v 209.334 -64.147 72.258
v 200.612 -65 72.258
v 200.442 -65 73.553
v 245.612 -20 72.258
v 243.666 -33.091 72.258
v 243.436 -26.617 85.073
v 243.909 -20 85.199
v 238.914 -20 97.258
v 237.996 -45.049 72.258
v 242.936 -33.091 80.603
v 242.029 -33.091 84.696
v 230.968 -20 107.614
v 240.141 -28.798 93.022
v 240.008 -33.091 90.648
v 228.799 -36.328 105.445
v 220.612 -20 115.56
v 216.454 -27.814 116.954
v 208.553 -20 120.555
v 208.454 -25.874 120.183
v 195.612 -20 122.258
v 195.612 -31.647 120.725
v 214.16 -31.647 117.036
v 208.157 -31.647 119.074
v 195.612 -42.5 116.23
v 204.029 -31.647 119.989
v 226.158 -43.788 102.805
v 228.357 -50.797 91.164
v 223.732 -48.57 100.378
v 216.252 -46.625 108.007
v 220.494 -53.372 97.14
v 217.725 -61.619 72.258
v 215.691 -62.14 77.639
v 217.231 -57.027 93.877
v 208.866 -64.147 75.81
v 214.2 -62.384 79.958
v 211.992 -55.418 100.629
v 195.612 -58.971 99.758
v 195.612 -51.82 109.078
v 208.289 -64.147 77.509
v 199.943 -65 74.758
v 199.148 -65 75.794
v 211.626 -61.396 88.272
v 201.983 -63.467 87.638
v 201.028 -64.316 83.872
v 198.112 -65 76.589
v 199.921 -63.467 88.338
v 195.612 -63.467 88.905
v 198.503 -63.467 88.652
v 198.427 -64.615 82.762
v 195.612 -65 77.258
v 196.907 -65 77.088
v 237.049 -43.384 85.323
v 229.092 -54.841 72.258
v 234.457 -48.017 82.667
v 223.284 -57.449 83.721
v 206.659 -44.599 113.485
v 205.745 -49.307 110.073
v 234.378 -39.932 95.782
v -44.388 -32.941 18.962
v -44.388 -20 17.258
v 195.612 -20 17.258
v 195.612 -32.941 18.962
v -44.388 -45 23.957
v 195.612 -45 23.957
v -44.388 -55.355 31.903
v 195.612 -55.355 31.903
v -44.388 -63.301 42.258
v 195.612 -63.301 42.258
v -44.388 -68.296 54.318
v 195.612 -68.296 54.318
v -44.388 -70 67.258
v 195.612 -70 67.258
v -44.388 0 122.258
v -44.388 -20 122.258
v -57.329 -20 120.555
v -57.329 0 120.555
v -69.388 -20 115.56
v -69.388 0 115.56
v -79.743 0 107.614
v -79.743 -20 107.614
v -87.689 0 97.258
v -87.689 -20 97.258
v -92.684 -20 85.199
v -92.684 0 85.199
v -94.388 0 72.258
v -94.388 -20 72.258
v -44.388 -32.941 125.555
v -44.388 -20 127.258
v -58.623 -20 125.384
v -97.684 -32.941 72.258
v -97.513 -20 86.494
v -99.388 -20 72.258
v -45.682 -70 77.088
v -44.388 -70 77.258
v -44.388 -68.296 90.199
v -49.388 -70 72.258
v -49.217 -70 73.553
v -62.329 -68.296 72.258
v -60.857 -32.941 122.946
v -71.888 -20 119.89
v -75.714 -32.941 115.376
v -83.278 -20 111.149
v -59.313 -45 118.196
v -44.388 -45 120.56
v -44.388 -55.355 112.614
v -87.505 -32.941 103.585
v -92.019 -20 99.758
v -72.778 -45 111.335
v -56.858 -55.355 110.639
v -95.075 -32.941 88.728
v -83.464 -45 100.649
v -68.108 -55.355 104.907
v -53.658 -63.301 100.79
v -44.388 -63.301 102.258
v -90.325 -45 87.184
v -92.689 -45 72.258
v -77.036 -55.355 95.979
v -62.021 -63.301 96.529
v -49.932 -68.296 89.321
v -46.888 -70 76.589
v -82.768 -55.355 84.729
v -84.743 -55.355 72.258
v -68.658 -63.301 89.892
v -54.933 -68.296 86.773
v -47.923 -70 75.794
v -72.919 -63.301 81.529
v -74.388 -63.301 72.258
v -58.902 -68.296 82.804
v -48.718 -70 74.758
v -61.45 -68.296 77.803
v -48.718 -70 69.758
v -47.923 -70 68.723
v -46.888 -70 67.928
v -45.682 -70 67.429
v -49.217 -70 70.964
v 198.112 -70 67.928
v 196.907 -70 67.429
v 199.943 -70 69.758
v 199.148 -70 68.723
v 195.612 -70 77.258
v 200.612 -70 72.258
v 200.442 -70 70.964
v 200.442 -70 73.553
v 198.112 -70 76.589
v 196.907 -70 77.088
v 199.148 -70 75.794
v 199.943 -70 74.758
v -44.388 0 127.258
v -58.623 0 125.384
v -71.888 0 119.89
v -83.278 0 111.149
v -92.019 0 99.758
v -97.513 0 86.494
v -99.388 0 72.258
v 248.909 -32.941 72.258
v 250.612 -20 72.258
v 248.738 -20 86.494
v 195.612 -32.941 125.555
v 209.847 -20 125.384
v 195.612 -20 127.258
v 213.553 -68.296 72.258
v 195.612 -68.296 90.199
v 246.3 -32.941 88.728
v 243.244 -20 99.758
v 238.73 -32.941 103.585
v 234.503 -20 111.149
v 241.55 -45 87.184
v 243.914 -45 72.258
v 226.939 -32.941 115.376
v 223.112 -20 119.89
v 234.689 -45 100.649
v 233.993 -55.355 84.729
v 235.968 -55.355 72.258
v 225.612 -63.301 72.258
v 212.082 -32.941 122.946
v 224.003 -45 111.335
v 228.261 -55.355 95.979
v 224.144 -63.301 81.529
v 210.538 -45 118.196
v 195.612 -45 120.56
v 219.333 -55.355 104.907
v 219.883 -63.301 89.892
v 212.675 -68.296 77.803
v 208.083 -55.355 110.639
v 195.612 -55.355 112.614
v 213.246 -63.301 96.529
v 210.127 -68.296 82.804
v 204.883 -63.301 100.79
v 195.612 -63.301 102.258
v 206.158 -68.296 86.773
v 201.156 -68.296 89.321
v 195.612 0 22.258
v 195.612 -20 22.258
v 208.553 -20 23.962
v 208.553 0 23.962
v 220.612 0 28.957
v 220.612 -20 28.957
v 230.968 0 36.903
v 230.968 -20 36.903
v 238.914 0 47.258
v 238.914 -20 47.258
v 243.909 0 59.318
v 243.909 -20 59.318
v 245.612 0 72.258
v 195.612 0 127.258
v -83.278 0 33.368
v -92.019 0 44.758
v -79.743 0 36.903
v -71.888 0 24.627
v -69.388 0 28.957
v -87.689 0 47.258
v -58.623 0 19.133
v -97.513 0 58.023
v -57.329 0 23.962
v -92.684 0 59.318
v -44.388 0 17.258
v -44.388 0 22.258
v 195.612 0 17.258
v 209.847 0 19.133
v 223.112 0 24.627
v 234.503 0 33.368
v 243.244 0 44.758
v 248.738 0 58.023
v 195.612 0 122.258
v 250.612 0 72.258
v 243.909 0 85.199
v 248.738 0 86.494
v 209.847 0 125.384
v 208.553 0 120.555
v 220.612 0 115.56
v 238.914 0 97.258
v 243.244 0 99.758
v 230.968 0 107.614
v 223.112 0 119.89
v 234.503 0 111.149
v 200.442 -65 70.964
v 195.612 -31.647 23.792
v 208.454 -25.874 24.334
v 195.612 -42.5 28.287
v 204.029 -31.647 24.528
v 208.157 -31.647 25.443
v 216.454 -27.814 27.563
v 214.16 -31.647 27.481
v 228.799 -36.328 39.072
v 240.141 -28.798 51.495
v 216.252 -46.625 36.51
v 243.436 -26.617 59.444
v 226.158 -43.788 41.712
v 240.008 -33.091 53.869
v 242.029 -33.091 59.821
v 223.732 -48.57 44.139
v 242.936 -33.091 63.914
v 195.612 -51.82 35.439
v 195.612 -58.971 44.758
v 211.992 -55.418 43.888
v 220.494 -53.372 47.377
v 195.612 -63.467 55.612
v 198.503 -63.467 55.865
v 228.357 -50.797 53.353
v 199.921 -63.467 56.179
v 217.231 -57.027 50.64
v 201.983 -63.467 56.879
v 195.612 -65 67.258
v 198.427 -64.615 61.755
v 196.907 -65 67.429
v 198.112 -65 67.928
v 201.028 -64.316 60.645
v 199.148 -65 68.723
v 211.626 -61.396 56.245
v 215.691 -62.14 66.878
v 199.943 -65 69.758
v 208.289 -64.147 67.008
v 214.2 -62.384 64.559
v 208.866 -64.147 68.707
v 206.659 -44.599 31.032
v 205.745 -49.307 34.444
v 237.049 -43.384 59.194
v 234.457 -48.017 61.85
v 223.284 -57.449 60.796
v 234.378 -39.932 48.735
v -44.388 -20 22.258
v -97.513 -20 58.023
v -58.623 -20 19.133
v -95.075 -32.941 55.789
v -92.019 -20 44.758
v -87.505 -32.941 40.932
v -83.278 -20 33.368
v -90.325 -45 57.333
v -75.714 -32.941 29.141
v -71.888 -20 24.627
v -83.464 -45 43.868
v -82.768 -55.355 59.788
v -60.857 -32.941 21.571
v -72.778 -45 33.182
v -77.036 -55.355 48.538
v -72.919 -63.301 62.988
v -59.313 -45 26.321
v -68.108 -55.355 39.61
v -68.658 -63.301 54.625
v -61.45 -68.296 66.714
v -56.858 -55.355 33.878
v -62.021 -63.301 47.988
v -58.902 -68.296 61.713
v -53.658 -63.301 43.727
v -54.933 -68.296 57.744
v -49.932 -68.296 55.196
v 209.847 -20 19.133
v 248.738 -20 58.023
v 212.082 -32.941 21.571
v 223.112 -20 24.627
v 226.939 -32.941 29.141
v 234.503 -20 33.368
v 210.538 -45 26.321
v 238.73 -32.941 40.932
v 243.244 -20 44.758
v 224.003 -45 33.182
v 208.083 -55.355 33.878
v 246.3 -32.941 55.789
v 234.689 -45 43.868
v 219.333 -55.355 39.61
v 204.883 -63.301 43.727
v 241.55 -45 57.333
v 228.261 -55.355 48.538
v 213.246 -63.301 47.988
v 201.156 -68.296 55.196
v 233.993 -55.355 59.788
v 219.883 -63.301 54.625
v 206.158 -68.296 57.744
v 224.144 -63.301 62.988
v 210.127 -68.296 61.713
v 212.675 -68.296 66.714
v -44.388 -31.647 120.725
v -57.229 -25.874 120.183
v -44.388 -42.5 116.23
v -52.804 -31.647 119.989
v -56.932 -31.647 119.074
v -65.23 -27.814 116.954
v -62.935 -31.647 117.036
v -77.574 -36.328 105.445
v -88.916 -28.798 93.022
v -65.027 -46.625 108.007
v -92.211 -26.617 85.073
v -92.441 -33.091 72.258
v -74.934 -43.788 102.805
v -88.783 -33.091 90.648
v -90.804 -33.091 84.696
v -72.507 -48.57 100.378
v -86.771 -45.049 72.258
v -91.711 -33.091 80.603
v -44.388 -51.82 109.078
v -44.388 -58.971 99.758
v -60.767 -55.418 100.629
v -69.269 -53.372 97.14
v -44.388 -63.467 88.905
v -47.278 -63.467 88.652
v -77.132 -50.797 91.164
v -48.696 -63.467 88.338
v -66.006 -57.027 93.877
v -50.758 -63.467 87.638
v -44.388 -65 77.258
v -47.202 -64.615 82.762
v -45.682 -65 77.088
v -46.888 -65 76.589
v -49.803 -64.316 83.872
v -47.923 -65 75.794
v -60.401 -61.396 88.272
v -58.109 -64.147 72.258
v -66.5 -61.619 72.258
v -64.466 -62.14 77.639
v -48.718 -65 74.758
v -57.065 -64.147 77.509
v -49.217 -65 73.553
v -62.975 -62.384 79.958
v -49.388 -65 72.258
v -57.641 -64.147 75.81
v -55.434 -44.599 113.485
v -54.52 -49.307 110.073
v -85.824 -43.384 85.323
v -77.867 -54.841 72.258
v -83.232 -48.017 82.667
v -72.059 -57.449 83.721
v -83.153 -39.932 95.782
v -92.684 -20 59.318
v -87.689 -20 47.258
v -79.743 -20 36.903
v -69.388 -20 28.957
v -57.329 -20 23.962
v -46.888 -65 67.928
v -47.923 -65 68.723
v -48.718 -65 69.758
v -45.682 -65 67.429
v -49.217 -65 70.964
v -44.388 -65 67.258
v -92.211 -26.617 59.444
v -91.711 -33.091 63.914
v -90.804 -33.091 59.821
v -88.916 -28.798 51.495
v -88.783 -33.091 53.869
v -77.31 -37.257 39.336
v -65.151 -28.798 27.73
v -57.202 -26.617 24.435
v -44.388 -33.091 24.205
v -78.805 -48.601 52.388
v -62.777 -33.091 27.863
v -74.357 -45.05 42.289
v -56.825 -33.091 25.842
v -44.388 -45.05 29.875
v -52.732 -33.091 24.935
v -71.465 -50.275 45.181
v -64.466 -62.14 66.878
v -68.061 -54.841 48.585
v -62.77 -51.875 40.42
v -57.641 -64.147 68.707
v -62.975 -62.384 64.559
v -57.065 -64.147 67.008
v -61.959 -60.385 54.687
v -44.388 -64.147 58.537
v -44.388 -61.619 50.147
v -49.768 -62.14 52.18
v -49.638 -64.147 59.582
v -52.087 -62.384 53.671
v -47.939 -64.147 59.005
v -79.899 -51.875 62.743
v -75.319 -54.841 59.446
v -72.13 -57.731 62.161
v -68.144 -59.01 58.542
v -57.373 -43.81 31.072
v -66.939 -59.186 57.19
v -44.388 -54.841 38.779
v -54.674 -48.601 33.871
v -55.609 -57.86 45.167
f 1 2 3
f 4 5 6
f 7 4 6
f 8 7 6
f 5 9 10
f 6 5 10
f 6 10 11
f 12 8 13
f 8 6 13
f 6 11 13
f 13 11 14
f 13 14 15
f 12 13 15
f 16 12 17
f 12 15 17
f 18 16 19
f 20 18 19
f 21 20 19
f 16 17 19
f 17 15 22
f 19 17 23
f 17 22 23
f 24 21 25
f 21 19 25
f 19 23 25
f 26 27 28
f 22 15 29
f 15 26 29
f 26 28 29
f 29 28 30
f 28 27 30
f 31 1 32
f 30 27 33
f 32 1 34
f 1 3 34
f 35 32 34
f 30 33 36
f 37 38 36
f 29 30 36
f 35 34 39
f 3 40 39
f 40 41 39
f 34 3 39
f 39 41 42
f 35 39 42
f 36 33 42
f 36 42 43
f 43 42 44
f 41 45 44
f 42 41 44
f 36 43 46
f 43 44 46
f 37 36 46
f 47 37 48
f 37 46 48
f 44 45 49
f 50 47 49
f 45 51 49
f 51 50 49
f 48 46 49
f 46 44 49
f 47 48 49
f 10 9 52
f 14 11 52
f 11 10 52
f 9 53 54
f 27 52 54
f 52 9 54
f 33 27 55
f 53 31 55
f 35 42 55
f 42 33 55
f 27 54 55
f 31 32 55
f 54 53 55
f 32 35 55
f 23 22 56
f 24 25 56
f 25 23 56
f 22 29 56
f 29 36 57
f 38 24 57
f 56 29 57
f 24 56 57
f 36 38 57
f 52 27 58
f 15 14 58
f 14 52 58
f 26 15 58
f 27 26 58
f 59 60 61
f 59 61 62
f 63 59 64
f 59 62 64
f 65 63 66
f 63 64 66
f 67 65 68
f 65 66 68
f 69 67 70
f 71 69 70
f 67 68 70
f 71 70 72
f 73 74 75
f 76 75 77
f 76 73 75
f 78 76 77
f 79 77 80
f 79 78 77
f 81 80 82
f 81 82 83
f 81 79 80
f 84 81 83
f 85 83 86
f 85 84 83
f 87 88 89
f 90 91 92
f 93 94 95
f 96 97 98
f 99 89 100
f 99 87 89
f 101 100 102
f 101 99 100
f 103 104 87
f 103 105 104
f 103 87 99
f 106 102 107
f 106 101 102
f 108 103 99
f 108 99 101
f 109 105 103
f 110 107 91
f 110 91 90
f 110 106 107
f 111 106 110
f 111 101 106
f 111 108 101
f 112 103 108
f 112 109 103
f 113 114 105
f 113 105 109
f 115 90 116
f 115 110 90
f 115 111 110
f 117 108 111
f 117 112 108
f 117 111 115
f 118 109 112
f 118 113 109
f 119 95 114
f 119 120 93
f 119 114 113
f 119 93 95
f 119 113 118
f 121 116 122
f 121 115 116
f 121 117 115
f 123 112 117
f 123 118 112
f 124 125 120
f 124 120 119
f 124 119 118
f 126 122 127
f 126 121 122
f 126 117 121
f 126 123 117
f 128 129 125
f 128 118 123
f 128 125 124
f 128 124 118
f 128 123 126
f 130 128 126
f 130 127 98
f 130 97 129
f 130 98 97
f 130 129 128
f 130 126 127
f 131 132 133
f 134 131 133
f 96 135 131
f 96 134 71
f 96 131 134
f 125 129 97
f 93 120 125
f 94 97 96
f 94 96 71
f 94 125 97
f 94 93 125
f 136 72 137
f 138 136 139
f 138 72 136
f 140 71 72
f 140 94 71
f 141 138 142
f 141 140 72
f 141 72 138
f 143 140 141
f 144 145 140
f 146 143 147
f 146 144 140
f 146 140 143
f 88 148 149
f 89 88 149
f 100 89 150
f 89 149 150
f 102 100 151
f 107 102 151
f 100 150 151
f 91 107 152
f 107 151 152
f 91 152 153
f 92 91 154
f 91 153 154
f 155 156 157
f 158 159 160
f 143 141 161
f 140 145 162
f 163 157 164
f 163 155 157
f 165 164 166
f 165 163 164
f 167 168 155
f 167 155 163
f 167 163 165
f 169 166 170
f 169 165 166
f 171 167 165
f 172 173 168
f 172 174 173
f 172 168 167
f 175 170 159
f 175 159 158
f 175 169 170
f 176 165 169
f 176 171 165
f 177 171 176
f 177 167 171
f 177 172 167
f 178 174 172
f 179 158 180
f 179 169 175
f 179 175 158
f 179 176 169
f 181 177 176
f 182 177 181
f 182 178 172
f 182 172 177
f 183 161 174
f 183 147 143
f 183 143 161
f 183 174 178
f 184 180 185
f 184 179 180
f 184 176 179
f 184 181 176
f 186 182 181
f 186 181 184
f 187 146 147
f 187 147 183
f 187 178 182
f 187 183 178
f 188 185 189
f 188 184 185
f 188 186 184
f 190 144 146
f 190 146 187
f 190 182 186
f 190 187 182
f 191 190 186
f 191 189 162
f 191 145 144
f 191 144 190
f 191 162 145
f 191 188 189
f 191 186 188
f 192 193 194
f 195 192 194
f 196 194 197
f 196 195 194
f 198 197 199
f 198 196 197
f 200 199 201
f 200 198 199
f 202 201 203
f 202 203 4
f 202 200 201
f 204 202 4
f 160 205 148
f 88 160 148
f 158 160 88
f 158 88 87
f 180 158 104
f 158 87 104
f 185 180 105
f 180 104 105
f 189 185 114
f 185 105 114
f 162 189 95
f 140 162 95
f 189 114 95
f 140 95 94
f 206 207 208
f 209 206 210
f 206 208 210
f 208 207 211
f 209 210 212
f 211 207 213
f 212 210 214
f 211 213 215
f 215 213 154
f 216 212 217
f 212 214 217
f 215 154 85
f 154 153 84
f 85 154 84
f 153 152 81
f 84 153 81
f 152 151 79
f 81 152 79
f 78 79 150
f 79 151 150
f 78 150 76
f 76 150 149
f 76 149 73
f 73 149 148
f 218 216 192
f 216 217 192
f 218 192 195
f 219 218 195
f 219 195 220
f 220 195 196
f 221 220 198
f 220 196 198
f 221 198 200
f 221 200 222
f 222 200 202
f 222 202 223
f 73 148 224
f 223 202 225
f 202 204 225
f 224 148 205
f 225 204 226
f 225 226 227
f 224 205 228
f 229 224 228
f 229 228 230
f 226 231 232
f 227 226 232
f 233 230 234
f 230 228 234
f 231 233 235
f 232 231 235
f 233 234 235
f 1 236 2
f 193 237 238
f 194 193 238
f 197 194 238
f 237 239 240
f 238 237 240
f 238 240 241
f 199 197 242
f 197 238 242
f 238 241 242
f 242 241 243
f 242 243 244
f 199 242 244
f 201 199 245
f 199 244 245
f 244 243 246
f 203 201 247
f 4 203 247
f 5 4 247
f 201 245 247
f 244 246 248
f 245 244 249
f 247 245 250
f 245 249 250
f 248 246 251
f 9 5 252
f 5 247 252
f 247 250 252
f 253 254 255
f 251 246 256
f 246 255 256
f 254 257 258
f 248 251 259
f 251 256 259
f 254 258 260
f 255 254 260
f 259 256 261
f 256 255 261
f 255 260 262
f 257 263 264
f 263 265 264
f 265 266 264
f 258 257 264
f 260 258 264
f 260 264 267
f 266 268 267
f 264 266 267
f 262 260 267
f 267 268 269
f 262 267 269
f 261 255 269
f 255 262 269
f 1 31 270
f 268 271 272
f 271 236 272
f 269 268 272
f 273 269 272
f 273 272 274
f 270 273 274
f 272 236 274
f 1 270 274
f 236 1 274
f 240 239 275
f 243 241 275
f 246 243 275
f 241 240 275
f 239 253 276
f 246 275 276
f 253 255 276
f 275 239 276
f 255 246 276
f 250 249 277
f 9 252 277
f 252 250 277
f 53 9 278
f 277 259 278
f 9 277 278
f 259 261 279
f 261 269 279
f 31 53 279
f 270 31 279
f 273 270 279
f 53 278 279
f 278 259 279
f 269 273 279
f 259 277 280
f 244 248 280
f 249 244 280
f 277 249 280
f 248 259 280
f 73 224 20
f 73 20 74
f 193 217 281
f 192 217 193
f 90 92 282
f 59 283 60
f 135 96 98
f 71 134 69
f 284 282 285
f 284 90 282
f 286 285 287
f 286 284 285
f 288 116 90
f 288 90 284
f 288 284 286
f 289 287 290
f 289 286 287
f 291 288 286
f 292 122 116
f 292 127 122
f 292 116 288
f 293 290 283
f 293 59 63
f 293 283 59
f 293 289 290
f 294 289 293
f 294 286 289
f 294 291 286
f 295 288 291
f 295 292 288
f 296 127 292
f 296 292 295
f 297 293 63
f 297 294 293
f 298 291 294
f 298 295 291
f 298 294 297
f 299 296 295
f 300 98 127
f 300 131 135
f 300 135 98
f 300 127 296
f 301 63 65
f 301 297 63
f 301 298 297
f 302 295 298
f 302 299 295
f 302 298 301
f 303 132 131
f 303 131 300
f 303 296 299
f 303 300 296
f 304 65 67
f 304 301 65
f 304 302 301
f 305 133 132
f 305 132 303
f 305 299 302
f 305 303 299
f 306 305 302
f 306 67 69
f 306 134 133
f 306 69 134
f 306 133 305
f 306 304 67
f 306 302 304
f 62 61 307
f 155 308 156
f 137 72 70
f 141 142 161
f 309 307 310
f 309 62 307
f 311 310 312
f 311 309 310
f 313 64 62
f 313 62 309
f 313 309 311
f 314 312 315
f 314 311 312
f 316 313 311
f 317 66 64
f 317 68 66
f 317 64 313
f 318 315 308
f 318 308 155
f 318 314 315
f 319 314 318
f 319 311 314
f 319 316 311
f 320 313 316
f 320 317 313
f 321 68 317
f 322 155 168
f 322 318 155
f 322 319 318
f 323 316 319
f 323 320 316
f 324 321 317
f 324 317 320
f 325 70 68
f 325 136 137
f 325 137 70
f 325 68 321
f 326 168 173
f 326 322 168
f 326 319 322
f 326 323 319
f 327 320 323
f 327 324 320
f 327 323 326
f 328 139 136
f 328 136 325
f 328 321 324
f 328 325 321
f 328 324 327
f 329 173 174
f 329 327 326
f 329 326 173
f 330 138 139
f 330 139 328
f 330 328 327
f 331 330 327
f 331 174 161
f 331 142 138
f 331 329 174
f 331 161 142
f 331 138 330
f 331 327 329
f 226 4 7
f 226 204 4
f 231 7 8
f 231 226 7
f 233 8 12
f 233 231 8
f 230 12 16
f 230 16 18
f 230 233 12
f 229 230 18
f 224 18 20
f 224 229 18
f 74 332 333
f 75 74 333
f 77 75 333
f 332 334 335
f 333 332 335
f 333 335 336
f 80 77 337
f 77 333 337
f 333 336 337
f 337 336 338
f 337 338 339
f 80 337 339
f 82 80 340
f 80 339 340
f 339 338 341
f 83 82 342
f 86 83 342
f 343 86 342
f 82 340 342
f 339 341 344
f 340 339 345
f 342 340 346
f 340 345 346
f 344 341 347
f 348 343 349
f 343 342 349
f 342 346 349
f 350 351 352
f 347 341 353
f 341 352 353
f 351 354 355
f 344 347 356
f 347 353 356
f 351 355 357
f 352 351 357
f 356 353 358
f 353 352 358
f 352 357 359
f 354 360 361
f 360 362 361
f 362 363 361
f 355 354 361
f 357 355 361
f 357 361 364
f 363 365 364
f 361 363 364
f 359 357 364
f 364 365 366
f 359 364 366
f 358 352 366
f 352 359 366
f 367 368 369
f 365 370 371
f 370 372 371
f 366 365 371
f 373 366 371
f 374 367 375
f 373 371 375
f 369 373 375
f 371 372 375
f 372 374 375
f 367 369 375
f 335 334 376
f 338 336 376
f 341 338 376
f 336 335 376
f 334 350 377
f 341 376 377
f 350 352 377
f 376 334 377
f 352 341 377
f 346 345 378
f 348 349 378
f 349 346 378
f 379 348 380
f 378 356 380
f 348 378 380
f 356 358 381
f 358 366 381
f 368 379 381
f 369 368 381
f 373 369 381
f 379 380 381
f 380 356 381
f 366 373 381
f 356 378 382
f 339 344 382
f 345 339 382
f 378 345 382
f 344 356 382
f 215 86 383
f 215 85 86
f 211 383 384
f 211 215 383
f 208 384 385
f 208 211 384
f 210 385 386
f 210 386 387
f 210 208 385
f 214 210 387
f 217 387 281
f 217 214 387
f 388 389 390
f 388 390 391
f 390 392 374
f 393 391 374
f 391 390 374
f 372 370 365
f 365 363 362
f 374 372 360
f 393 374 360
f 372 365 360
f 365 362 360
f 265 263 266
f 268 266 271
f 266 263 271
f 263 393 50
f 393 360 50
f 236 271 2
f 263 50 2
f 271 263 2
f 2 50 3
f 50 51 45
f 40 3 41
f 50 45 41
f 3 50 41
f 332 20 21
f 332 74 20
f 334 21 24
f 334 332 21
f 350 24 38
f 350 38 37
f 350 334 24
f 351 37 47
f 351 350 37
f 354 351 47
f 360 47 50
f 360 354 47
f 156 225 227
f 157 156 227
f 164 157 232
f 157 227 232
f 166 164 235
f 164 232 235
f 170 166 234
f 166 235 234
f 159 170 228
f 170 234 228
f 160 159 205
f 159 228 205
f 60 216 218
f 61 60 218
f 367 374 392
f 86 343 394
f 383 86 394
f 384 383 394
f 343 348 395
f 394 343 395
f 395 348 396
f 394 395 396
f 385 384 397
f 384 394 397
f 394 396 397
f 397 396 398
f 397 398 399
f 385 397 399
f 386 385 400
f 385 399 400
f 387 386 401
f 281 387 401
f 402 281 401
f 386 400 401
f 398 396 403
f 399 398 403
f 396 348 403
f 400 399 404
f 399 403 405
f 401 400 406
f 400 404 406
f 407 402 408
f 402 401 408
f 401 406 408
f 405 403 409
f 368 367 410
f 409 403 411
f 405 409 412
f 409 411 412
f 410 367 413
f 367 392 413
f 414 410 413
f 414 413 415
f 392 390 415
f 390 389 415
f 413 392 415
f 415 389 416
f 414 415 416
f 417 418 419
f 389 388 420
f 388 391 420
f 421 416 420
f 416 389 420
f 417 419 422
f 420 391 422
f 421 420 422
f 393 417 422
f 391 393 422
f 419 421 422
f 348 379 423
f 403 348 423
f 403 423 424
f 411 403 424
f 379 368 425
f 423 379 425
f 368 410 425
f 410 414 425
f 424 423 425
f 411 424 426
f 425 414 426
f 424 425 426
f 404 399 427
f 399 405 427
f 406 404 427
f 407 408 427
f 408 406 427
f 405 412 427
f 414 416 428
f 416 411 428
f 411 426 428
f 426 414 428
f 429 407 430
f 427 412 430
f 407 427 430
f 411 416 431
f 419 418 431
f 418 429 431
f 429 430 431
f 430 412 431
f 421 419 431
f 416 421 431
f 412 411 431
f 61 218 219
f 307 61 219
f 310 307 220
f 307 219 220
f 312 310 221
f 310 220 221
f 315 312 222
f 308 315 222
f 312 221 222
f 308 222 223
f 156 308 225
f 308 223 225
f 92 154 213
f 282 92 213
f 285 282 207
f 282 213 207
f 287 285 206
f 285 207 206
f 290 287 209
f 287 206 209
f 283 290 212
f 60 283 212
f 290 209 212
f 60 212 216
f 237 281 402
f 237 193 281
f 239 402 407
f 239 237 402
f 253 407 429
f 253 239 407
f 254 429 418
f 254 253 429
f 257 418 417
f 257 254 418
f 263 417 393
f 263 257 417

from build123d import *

# Parameters (mm, degrees)
F1_DEPTH = 70
F2_R     = 50
F3_T     = -5


with BuildPart() as f1:
    # F0 (on Front) → F1 (new body)
    with BuildSketch(Plane.XZ):
        with BuildLine():
            Line((195.61244, 127.258498), (-44.38756, 127.258498))
            ThreePointArc((-44.38756, 127.258498), (-83.278433, 111.149371), (-99.38756, 72.258498))
            ThreePointArc((-99.38756, 72.258498), (-83.278433, 33.367625), (-44.38756, 17.258498))
            Line((-44.38756, 17.258498), (195.61244, 17.258498))
            ThreePointArc((195.61244, 17.258498), (234.503313, 33.367625), (250.61244, 72.258498))
            ThreePointArc((250.61244, 72.258498), (234.503313, 111.149371), (195.61244, 127.258498))
        make_face()
    extrude(amount=F1_DEPTH)

    # F2
    f2_edges = [f1.edges().sort_by_distance(p)[0] for p in [
        (75.61244, -70, 127.258498),
        (-99.38756, -70, 72.258498),
        (75.61244, -70, 17.258498),
        (250.61244, -70, 72.258498),
    ]]
    fillet(f2_edges, radius=F2_R)

    # F3
    f3_openings = [f1.faces().sort_by_distance(p)[0] for p in [
        (75.61244, 0, 72.258498),
    ]]
    offset(amount=F3_T, openings=f3_openings)


solid = f1.part
